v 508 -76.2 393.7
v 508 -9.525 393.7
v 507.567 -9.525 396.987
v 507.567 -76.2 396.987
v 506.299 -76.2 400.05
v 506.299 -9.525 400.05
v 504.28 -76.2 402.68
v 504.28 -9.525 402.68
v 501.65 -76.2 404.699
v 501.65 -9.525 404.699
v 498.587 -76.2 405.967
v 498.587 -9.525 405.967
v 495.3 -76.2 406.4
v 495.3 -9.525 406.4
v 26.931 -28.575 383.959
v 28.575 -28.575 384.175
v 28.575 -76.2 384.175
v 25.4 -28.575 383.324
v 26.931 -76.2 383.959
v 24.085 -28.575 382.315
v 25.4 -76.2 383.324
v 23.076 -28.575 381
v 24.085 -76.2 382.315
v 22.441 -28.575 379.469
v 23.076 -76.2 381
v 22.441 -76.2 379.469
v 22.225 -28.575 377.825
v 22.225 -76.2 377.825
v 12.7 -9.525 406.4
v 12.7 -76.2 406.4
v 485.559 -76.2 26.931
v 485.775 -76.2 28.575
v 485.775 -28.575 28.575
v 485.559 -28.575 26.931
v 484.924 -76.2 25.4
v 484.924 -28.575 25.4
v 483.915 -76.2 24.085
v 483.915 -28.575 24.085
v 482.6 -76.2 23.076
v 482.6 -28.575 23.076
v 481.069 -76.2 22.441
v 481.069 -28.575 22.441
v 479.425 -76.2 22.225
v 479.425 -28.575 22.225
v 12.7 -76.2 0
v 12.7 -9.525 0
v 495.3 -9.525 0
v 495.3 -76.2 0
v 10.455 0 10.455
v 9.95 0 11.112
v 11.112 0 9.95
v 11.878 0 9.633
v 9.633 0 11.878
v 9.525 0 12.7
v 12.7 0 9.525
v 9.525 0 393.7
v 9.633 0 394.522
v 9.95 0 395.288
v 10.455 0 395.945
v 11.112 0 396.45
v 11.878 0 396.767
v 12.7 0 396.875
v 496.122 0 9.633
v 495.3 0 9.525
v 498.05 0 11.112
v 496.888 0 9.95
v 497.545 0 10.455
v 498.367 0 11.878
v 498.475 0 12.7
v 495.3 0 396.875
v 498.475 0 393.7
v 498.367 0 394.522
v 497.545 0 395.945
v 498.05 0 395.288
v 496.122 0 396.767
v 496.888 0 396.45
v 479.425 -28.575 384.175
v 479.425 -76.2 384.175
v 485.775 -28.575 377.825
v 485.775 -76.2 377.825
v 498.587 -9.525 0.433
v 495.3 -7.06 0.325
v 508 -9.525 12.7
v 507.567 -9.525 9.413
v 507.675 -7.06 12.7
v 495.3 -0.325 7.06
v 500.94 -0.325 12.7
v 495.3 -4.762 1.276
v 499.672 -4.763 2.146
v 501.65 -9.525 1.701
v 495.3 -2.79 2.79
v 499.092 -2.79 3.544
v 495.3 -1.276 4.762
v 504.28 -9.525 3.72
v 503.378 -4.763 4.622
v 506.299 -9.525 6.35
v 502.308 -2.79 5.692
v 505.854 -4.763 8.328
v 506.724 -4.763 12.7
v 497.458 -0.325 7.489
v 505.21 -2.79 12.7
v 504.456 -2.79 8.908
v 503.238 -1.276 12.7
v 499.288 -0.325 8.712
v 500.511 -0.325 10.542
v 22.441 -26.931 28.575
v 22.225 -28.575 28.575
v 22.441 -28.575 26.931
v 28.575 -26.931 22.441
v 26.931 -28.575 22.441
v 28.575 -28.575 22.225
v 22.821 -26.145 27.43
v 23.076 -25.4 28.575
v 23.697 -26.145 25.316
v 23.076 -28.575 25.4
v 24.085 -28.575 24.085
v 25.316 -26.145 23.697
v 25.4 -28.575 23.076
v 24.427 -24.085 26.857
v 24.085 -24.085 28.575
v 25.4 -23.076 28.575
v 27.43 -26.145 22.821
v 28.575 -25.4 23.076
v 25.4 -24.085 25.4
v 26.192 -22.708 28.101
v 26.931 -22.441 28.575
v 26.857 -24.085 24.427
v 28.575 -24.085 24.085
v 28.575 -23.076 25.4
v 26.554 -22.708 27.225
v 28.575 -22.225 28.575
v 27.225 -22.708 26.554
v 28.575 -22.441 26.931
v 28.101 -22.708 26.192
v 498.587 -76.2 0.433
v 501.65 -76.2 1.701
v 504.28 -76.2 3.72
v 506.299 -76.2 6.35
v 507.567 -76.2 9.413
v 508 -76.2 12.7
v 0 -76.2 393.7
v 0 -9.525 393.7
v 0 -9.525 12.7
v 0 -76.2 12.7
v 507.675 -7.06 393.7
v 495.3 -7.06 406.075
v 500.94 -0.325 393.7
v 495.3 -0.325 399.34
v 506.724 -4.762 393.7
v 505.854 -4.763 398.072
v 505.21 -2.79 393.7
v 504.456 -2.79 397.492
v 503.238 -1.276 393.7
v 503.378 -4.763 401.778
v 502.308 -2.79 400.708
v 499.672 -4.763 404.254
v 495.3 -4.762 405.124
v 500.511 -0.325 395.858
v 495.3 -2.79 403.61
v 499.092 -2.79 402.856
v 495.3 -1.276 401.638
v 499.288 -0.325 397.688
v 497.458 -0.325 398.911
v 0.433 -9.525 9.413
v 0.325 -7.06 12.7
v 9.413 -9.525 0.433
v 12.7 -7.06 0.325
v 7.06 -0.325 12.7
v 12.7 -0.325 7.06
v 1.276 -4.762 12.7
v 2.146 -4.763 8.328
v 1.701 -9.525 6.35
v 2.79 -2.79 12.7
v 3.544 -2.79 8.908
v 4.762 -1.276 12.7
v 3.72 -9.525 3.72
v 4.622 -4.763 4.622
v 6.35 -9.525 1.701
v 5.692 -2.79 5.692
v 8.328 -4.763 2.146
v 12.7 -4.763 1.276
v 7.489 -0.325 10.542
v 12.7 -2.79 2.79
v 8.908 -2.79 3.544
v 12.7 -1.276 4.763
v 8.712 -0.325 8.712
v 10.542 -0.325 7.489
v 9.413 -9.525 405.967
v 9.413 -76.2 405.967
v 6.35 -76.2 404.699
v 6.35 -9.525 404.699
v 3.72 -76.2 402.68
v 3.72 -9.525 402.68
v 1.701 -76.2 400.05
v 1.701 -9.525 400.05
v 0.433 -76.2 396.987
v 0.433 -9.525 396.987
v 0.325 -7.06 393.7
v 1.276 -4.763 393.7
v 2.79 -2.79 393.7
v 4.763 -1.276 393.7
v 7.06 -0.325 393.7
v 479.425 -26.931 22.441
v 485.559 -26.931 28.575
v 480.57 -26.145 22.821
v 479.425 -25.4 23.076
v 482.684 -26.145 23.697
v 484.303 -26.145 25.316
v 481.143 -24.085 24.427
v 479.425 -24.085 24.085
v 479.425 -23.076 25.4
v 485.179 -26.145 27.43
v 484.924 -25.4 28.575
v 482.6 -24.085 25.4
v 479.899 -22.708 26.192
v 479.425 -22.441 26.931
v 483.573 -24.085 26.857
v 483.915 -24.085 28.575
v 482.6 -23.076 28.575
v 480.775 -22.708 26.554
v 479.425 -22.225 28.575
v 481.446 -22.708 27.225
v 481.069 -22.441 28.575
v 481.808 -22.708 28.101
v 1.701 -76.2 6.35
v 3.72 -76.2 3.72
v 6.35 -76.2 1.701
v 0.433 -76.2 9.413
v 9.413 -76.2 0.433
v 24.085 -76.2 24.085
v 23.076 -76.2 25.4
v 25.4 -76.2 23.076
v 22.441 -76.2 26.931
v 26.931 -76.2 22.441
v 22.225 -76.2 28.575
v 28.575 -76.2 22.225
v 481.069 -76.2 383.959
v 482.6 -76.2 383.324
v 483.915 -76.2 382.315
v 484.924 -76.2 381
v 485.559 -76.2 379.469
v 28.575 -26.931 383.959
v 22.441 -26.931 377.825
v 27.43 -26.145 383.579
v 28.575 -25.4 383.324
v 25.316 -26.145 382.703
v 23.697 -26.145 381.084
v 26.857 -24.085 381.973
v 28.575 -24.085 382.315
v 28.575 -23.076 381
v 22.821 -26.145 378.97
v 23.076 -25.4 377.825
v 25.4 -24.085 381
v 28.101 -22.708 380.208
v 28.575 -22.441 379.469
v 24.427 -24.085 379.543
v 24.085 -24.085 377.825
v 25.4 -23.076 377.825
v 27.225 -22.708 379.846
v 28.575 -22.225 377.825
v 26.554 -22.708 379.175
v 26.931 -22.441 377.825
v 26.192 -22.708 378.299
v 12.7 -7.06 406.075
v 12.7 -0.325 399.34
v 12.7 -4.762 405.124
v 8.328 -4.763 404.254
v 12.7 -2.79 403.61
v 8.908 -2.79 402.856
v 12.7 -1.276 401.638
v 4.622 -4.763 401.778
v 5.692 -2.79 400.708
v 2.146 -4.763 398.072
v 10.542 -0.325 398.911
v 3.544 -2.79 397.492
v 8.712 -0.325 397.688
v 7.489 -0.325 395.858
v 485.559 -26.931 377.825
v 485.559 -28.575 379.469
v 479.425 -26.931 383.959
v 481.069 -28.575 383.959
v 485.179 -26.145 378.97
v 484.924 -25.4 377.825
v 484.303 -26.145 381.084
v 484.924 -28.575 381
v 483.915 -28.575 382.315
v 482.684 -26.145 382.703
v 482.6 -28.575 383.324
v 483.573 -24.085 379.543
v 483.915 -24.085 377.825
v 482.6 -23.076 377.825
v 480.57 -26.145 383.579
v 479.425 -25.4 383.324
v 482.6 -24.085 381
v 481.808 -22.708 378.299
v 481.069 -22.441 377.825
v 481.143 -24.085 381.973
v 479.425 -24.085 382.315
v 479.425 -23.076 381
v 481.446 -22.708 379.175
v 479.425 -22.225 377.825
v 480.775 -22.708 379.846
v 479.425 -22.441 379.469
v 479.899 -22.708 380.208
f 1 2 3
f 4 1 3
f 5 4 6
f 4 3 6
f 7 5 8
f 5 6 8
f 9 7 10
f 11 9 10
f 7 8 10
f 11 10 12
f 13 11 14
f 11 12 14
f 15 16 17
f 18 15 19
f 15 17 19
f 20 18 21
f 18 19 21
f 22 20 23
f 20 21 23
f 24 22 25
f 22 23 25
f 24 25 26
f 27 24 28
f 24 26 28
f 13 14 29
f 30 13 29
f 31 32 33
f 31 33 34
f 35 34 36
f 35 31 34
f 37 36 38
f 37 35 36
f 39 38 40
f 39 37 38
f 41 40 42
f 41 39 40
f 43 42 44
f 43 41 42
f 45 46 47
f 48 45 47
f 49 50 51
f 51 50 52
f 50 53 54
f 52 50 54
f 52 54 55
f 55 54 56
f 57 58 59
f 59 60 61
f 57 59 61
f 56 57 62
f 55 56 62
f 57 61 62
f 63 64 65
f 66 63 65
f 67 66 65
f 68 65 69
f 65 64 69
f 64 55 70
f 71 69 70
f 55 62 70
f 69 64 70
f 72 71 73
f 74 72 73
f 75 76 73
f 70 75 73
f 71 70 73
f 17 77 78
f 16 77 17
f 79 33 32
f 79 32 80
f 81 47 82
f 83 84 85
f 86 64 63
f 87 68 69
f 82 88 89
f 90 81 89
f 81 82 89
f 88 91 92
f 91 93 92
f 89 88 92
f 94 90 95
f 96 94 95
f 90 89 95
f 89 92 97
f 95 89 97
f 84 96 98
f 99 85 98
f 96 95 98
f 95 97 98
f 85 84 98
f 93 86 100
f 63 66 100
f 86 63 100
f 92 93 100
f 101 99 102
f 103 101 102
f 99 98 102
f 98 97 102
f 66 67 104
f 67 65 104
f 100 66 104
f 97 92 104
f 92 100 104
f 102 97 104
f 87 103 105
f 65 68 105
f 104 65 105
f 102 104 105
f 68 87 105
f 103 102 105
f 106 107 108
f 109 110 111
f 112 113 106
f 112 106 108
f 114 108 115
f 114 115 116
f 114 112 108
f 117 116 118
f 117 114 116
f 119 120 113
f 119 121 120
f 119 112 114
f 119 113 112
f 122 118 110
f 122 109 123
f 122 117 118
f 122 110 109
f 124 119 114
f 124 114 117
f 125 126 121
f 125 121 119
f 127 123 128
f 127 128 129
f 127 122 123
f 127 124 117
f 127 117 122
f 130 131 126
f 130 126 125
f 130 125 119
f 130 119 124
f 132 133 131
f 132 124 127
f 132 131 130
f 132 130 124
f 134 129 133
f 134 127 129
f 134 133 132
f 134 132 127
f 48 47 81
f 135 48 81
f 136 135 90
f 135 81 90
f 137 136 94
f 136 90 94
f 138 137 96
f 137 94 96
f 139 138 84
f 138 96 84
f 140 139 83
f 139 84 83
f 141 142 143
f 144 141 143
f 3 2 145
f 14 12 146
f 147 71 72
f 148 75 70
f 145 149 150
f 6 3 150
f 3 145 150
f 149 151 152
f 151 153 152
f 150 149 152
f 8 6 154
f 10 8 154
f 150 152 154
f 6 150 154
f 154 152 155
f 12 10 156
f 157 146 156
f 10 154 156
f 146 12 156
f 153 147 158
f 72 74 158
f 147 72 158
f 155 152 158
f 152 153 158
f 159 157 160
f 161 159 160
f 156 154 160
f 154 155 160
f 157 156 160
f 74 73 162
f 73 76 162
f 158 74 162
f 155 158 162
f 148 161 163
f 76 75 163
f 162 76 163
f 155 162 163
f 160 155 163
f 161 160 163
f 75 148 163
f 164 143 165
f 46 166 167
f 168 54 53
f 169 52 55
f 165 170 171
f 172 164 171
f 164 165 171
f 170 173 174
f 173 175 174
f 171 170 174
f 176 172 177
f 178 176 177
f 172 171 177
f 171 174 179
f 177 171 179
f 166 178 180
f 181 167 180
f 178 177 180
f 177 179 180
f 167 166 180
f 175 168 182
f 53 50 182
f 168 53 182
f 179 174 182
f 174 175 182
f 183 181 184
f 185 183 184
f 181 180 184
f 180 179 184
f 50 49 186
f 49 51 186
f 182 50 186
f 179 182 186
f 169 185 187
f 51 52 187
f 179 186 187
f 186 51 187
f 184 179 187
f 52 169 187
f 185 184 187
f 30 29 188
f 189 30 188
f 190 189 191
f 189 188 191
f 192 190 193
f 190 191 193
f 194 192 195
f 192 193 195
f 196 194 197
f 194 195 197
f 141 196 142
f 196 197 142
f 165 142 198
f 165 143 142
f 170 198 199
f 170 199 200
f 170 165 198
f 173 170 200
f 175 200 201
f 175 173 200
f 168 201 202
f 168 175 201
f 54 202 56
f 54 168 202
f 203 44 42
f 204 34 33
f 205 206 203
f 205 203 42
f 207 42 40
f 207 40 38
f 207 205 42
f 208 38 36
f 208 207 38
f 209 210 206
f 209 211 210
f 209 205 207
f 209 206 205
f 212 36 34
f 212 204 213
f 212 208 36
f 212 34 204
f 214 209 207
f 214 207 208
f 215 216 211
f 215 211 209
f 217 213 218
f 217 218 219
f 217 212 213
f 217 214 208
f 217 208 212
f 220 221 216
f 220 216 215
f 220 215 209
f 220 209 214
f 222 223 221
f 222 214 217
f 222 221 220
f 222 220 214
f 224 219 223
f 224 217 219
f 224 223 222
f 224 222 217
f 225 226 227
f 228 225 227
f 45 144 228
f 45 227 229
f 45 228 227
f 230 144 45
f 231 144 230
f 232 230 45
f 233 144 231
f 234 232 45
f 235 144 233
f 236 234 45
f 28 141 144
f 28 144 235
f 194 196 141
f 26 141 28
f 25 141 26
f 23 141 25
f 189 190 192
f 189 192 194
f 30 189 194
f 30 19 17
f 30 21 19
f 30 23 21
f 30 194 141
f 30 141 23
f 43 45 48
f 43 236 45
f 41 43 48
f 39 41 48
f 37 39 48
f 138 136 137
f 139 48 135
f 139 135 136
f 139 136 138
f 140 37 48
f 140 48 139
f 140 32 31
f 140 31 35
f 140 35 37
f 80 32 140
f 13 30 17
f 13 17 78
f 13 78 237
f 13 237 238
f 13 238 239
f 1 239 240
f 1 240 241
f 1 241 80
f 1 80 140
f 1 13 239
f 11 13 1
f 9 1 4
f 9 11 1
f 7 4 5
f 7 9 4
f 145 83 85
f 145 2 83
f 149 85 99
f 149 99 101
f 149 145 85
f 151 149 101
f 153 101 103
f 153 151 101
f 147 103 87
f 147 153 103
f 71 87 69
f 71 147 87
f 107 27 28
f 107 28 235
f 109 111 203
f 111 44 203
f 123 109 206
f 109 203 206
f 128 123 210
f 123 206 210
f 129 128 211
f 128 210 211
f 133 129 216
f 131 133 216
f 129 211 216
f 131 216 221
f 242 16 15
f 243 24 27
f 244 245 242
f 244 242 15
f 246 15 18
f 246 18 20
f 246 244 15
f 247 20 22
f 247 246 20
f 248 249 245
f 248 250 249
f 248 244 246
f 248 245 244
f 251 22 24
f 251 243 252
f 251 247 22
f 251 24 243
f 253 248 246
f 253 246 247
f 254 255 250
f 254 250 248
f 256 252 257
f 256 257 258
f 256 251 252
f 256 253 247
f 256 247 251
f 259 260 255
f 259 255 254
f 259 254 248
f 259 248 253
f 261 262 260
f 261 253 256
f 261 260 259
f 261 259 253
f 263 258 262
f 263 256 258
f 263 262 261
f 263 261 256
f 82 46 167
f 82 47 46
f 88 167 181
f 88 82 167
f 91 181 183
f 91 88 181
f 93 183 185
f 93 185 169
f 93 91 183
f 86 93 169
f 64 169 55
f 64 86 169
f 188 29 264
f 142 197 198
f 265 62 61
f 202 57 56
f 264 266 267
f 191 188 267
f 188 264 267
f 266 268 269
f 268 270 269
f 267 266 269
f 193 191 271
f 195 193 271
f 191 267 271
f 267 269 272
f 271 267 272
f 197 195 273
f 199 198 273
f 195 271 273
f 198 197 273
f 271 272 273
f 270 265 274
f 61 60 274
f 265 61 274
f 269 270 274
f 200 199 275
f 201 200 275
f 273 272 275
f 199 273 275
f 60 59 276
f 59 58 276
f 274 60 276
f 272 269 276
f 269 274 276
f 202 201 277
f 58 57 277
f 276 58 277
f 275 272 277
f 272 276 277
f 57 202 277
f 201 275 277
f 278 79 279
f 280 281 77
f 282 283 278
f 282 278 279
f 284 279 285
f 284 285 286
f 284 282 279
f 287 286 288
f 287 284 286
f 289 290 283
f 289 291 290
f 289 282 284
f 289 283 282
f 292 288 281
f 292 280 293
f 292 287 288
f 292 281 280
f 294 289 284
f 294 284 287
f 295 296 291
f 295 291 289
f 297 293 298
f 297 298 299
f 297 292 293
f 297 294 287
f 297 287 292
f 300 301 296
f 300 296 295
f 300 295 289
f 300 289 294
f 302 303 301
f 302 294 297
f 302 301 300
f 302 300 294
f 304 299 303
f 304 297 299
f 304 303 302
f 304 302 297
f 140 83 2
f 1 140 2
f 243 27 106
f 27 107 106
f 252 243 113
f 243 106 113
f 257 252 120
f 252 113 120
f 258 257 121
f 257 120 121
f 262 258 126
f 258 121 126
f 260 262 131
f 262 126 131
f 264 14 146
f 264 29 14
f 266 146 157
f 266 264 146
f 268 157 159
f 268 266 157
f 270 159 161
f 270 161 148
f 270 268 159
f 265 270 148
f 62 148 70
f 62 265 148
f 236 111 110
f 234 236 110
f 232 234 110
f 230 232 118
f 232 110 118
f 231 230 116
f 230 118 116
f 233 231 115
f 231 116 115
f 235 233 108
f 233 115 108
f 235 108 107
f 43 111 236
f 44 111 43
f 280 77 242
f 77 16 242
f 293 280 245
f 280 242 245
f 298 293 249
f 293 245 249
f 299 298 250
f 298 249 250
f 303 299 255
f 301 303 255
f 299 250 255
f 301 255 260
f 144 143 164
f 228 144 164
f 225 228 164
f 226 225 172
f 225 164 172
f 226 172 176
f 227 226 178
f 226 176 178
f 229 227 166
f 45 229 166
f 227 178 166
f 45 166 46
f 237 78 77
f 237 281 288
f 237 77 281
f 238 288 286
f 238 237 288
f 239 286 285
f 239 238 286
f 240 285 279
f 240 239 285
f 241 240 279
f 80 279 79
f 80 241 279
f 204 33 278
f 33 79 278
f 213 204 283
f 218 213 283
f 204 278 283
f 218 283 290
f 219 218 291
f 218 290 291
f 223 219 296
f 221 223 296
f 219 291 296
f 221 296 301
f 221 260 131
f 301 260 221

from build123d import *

# Parameters (mm, degrees)
F1_DEPTH = 76.2
F2_T     = -22.225
F3_R     = 9.525
F4_R     = 6.35
F5_R     = 6.35


with BuildPart() as f1:
    # F0 (on Front) → F1 (new body)
    with BuildSketch(Plane.XZ):
        with BuildLine():
            ThreePointArc((0, 12.7), (3.7197438789, 3.7197438789), (12.7, 0))
            Line((12.7, 0), (495.3, 0))
            ThreePointArc((495.3, 0), (504.2802561211, 3.7197438789), (508, 12.7))
            Line((508, 12.7), (508, 393.7))
            ThreePointArc((508, 393.7), (504.2802561211, 402.6802561211), (495.3, 406.4))
            Line((495.3, 406.4), (12.7, 406.4))
            ThreePointArc((12.7, 406.4), (3.7197438789, 402.6802561211), (0, 393.7))
            Line((0, 393.7), (0, 12.7))
        make_face()
    extrude(amount=F1_DEPTH)

    # F2
    f2_openings = [f1.faces().sort_by_distance(p)[0] for p in [
        (254, -76.2, 203.2),
    ]]
    offset(amount=F2_T, openings=f2_openings)

    # F3
    f3_edges = [f1.edges().sort_by_distance(p)[0] for p in [
        (254, 0, 406.4),
    ]]
    fillet(f3_edges, radius=F3_R)

    # F4
    f4_edges = [f1.edges().sort_by_distance(p)[0] for p in [
        (22.225, -49.2125, 22.225),
        (485.775, -49.2125, 22.225),
        (485.775, -49.2125, 384.175),
        (22.225, -49.2125, 384.175),
    ]]
    fillet(f4_edges, radius=F4_R)

    # F5
    f5_edges = [f1.edges().sort_by_distance(p)[0] for p in [
        (22.225, -22.225, 203.2),
    ]]
    fillet(f5_edges, radius=F5_R)


solid = f1.part
